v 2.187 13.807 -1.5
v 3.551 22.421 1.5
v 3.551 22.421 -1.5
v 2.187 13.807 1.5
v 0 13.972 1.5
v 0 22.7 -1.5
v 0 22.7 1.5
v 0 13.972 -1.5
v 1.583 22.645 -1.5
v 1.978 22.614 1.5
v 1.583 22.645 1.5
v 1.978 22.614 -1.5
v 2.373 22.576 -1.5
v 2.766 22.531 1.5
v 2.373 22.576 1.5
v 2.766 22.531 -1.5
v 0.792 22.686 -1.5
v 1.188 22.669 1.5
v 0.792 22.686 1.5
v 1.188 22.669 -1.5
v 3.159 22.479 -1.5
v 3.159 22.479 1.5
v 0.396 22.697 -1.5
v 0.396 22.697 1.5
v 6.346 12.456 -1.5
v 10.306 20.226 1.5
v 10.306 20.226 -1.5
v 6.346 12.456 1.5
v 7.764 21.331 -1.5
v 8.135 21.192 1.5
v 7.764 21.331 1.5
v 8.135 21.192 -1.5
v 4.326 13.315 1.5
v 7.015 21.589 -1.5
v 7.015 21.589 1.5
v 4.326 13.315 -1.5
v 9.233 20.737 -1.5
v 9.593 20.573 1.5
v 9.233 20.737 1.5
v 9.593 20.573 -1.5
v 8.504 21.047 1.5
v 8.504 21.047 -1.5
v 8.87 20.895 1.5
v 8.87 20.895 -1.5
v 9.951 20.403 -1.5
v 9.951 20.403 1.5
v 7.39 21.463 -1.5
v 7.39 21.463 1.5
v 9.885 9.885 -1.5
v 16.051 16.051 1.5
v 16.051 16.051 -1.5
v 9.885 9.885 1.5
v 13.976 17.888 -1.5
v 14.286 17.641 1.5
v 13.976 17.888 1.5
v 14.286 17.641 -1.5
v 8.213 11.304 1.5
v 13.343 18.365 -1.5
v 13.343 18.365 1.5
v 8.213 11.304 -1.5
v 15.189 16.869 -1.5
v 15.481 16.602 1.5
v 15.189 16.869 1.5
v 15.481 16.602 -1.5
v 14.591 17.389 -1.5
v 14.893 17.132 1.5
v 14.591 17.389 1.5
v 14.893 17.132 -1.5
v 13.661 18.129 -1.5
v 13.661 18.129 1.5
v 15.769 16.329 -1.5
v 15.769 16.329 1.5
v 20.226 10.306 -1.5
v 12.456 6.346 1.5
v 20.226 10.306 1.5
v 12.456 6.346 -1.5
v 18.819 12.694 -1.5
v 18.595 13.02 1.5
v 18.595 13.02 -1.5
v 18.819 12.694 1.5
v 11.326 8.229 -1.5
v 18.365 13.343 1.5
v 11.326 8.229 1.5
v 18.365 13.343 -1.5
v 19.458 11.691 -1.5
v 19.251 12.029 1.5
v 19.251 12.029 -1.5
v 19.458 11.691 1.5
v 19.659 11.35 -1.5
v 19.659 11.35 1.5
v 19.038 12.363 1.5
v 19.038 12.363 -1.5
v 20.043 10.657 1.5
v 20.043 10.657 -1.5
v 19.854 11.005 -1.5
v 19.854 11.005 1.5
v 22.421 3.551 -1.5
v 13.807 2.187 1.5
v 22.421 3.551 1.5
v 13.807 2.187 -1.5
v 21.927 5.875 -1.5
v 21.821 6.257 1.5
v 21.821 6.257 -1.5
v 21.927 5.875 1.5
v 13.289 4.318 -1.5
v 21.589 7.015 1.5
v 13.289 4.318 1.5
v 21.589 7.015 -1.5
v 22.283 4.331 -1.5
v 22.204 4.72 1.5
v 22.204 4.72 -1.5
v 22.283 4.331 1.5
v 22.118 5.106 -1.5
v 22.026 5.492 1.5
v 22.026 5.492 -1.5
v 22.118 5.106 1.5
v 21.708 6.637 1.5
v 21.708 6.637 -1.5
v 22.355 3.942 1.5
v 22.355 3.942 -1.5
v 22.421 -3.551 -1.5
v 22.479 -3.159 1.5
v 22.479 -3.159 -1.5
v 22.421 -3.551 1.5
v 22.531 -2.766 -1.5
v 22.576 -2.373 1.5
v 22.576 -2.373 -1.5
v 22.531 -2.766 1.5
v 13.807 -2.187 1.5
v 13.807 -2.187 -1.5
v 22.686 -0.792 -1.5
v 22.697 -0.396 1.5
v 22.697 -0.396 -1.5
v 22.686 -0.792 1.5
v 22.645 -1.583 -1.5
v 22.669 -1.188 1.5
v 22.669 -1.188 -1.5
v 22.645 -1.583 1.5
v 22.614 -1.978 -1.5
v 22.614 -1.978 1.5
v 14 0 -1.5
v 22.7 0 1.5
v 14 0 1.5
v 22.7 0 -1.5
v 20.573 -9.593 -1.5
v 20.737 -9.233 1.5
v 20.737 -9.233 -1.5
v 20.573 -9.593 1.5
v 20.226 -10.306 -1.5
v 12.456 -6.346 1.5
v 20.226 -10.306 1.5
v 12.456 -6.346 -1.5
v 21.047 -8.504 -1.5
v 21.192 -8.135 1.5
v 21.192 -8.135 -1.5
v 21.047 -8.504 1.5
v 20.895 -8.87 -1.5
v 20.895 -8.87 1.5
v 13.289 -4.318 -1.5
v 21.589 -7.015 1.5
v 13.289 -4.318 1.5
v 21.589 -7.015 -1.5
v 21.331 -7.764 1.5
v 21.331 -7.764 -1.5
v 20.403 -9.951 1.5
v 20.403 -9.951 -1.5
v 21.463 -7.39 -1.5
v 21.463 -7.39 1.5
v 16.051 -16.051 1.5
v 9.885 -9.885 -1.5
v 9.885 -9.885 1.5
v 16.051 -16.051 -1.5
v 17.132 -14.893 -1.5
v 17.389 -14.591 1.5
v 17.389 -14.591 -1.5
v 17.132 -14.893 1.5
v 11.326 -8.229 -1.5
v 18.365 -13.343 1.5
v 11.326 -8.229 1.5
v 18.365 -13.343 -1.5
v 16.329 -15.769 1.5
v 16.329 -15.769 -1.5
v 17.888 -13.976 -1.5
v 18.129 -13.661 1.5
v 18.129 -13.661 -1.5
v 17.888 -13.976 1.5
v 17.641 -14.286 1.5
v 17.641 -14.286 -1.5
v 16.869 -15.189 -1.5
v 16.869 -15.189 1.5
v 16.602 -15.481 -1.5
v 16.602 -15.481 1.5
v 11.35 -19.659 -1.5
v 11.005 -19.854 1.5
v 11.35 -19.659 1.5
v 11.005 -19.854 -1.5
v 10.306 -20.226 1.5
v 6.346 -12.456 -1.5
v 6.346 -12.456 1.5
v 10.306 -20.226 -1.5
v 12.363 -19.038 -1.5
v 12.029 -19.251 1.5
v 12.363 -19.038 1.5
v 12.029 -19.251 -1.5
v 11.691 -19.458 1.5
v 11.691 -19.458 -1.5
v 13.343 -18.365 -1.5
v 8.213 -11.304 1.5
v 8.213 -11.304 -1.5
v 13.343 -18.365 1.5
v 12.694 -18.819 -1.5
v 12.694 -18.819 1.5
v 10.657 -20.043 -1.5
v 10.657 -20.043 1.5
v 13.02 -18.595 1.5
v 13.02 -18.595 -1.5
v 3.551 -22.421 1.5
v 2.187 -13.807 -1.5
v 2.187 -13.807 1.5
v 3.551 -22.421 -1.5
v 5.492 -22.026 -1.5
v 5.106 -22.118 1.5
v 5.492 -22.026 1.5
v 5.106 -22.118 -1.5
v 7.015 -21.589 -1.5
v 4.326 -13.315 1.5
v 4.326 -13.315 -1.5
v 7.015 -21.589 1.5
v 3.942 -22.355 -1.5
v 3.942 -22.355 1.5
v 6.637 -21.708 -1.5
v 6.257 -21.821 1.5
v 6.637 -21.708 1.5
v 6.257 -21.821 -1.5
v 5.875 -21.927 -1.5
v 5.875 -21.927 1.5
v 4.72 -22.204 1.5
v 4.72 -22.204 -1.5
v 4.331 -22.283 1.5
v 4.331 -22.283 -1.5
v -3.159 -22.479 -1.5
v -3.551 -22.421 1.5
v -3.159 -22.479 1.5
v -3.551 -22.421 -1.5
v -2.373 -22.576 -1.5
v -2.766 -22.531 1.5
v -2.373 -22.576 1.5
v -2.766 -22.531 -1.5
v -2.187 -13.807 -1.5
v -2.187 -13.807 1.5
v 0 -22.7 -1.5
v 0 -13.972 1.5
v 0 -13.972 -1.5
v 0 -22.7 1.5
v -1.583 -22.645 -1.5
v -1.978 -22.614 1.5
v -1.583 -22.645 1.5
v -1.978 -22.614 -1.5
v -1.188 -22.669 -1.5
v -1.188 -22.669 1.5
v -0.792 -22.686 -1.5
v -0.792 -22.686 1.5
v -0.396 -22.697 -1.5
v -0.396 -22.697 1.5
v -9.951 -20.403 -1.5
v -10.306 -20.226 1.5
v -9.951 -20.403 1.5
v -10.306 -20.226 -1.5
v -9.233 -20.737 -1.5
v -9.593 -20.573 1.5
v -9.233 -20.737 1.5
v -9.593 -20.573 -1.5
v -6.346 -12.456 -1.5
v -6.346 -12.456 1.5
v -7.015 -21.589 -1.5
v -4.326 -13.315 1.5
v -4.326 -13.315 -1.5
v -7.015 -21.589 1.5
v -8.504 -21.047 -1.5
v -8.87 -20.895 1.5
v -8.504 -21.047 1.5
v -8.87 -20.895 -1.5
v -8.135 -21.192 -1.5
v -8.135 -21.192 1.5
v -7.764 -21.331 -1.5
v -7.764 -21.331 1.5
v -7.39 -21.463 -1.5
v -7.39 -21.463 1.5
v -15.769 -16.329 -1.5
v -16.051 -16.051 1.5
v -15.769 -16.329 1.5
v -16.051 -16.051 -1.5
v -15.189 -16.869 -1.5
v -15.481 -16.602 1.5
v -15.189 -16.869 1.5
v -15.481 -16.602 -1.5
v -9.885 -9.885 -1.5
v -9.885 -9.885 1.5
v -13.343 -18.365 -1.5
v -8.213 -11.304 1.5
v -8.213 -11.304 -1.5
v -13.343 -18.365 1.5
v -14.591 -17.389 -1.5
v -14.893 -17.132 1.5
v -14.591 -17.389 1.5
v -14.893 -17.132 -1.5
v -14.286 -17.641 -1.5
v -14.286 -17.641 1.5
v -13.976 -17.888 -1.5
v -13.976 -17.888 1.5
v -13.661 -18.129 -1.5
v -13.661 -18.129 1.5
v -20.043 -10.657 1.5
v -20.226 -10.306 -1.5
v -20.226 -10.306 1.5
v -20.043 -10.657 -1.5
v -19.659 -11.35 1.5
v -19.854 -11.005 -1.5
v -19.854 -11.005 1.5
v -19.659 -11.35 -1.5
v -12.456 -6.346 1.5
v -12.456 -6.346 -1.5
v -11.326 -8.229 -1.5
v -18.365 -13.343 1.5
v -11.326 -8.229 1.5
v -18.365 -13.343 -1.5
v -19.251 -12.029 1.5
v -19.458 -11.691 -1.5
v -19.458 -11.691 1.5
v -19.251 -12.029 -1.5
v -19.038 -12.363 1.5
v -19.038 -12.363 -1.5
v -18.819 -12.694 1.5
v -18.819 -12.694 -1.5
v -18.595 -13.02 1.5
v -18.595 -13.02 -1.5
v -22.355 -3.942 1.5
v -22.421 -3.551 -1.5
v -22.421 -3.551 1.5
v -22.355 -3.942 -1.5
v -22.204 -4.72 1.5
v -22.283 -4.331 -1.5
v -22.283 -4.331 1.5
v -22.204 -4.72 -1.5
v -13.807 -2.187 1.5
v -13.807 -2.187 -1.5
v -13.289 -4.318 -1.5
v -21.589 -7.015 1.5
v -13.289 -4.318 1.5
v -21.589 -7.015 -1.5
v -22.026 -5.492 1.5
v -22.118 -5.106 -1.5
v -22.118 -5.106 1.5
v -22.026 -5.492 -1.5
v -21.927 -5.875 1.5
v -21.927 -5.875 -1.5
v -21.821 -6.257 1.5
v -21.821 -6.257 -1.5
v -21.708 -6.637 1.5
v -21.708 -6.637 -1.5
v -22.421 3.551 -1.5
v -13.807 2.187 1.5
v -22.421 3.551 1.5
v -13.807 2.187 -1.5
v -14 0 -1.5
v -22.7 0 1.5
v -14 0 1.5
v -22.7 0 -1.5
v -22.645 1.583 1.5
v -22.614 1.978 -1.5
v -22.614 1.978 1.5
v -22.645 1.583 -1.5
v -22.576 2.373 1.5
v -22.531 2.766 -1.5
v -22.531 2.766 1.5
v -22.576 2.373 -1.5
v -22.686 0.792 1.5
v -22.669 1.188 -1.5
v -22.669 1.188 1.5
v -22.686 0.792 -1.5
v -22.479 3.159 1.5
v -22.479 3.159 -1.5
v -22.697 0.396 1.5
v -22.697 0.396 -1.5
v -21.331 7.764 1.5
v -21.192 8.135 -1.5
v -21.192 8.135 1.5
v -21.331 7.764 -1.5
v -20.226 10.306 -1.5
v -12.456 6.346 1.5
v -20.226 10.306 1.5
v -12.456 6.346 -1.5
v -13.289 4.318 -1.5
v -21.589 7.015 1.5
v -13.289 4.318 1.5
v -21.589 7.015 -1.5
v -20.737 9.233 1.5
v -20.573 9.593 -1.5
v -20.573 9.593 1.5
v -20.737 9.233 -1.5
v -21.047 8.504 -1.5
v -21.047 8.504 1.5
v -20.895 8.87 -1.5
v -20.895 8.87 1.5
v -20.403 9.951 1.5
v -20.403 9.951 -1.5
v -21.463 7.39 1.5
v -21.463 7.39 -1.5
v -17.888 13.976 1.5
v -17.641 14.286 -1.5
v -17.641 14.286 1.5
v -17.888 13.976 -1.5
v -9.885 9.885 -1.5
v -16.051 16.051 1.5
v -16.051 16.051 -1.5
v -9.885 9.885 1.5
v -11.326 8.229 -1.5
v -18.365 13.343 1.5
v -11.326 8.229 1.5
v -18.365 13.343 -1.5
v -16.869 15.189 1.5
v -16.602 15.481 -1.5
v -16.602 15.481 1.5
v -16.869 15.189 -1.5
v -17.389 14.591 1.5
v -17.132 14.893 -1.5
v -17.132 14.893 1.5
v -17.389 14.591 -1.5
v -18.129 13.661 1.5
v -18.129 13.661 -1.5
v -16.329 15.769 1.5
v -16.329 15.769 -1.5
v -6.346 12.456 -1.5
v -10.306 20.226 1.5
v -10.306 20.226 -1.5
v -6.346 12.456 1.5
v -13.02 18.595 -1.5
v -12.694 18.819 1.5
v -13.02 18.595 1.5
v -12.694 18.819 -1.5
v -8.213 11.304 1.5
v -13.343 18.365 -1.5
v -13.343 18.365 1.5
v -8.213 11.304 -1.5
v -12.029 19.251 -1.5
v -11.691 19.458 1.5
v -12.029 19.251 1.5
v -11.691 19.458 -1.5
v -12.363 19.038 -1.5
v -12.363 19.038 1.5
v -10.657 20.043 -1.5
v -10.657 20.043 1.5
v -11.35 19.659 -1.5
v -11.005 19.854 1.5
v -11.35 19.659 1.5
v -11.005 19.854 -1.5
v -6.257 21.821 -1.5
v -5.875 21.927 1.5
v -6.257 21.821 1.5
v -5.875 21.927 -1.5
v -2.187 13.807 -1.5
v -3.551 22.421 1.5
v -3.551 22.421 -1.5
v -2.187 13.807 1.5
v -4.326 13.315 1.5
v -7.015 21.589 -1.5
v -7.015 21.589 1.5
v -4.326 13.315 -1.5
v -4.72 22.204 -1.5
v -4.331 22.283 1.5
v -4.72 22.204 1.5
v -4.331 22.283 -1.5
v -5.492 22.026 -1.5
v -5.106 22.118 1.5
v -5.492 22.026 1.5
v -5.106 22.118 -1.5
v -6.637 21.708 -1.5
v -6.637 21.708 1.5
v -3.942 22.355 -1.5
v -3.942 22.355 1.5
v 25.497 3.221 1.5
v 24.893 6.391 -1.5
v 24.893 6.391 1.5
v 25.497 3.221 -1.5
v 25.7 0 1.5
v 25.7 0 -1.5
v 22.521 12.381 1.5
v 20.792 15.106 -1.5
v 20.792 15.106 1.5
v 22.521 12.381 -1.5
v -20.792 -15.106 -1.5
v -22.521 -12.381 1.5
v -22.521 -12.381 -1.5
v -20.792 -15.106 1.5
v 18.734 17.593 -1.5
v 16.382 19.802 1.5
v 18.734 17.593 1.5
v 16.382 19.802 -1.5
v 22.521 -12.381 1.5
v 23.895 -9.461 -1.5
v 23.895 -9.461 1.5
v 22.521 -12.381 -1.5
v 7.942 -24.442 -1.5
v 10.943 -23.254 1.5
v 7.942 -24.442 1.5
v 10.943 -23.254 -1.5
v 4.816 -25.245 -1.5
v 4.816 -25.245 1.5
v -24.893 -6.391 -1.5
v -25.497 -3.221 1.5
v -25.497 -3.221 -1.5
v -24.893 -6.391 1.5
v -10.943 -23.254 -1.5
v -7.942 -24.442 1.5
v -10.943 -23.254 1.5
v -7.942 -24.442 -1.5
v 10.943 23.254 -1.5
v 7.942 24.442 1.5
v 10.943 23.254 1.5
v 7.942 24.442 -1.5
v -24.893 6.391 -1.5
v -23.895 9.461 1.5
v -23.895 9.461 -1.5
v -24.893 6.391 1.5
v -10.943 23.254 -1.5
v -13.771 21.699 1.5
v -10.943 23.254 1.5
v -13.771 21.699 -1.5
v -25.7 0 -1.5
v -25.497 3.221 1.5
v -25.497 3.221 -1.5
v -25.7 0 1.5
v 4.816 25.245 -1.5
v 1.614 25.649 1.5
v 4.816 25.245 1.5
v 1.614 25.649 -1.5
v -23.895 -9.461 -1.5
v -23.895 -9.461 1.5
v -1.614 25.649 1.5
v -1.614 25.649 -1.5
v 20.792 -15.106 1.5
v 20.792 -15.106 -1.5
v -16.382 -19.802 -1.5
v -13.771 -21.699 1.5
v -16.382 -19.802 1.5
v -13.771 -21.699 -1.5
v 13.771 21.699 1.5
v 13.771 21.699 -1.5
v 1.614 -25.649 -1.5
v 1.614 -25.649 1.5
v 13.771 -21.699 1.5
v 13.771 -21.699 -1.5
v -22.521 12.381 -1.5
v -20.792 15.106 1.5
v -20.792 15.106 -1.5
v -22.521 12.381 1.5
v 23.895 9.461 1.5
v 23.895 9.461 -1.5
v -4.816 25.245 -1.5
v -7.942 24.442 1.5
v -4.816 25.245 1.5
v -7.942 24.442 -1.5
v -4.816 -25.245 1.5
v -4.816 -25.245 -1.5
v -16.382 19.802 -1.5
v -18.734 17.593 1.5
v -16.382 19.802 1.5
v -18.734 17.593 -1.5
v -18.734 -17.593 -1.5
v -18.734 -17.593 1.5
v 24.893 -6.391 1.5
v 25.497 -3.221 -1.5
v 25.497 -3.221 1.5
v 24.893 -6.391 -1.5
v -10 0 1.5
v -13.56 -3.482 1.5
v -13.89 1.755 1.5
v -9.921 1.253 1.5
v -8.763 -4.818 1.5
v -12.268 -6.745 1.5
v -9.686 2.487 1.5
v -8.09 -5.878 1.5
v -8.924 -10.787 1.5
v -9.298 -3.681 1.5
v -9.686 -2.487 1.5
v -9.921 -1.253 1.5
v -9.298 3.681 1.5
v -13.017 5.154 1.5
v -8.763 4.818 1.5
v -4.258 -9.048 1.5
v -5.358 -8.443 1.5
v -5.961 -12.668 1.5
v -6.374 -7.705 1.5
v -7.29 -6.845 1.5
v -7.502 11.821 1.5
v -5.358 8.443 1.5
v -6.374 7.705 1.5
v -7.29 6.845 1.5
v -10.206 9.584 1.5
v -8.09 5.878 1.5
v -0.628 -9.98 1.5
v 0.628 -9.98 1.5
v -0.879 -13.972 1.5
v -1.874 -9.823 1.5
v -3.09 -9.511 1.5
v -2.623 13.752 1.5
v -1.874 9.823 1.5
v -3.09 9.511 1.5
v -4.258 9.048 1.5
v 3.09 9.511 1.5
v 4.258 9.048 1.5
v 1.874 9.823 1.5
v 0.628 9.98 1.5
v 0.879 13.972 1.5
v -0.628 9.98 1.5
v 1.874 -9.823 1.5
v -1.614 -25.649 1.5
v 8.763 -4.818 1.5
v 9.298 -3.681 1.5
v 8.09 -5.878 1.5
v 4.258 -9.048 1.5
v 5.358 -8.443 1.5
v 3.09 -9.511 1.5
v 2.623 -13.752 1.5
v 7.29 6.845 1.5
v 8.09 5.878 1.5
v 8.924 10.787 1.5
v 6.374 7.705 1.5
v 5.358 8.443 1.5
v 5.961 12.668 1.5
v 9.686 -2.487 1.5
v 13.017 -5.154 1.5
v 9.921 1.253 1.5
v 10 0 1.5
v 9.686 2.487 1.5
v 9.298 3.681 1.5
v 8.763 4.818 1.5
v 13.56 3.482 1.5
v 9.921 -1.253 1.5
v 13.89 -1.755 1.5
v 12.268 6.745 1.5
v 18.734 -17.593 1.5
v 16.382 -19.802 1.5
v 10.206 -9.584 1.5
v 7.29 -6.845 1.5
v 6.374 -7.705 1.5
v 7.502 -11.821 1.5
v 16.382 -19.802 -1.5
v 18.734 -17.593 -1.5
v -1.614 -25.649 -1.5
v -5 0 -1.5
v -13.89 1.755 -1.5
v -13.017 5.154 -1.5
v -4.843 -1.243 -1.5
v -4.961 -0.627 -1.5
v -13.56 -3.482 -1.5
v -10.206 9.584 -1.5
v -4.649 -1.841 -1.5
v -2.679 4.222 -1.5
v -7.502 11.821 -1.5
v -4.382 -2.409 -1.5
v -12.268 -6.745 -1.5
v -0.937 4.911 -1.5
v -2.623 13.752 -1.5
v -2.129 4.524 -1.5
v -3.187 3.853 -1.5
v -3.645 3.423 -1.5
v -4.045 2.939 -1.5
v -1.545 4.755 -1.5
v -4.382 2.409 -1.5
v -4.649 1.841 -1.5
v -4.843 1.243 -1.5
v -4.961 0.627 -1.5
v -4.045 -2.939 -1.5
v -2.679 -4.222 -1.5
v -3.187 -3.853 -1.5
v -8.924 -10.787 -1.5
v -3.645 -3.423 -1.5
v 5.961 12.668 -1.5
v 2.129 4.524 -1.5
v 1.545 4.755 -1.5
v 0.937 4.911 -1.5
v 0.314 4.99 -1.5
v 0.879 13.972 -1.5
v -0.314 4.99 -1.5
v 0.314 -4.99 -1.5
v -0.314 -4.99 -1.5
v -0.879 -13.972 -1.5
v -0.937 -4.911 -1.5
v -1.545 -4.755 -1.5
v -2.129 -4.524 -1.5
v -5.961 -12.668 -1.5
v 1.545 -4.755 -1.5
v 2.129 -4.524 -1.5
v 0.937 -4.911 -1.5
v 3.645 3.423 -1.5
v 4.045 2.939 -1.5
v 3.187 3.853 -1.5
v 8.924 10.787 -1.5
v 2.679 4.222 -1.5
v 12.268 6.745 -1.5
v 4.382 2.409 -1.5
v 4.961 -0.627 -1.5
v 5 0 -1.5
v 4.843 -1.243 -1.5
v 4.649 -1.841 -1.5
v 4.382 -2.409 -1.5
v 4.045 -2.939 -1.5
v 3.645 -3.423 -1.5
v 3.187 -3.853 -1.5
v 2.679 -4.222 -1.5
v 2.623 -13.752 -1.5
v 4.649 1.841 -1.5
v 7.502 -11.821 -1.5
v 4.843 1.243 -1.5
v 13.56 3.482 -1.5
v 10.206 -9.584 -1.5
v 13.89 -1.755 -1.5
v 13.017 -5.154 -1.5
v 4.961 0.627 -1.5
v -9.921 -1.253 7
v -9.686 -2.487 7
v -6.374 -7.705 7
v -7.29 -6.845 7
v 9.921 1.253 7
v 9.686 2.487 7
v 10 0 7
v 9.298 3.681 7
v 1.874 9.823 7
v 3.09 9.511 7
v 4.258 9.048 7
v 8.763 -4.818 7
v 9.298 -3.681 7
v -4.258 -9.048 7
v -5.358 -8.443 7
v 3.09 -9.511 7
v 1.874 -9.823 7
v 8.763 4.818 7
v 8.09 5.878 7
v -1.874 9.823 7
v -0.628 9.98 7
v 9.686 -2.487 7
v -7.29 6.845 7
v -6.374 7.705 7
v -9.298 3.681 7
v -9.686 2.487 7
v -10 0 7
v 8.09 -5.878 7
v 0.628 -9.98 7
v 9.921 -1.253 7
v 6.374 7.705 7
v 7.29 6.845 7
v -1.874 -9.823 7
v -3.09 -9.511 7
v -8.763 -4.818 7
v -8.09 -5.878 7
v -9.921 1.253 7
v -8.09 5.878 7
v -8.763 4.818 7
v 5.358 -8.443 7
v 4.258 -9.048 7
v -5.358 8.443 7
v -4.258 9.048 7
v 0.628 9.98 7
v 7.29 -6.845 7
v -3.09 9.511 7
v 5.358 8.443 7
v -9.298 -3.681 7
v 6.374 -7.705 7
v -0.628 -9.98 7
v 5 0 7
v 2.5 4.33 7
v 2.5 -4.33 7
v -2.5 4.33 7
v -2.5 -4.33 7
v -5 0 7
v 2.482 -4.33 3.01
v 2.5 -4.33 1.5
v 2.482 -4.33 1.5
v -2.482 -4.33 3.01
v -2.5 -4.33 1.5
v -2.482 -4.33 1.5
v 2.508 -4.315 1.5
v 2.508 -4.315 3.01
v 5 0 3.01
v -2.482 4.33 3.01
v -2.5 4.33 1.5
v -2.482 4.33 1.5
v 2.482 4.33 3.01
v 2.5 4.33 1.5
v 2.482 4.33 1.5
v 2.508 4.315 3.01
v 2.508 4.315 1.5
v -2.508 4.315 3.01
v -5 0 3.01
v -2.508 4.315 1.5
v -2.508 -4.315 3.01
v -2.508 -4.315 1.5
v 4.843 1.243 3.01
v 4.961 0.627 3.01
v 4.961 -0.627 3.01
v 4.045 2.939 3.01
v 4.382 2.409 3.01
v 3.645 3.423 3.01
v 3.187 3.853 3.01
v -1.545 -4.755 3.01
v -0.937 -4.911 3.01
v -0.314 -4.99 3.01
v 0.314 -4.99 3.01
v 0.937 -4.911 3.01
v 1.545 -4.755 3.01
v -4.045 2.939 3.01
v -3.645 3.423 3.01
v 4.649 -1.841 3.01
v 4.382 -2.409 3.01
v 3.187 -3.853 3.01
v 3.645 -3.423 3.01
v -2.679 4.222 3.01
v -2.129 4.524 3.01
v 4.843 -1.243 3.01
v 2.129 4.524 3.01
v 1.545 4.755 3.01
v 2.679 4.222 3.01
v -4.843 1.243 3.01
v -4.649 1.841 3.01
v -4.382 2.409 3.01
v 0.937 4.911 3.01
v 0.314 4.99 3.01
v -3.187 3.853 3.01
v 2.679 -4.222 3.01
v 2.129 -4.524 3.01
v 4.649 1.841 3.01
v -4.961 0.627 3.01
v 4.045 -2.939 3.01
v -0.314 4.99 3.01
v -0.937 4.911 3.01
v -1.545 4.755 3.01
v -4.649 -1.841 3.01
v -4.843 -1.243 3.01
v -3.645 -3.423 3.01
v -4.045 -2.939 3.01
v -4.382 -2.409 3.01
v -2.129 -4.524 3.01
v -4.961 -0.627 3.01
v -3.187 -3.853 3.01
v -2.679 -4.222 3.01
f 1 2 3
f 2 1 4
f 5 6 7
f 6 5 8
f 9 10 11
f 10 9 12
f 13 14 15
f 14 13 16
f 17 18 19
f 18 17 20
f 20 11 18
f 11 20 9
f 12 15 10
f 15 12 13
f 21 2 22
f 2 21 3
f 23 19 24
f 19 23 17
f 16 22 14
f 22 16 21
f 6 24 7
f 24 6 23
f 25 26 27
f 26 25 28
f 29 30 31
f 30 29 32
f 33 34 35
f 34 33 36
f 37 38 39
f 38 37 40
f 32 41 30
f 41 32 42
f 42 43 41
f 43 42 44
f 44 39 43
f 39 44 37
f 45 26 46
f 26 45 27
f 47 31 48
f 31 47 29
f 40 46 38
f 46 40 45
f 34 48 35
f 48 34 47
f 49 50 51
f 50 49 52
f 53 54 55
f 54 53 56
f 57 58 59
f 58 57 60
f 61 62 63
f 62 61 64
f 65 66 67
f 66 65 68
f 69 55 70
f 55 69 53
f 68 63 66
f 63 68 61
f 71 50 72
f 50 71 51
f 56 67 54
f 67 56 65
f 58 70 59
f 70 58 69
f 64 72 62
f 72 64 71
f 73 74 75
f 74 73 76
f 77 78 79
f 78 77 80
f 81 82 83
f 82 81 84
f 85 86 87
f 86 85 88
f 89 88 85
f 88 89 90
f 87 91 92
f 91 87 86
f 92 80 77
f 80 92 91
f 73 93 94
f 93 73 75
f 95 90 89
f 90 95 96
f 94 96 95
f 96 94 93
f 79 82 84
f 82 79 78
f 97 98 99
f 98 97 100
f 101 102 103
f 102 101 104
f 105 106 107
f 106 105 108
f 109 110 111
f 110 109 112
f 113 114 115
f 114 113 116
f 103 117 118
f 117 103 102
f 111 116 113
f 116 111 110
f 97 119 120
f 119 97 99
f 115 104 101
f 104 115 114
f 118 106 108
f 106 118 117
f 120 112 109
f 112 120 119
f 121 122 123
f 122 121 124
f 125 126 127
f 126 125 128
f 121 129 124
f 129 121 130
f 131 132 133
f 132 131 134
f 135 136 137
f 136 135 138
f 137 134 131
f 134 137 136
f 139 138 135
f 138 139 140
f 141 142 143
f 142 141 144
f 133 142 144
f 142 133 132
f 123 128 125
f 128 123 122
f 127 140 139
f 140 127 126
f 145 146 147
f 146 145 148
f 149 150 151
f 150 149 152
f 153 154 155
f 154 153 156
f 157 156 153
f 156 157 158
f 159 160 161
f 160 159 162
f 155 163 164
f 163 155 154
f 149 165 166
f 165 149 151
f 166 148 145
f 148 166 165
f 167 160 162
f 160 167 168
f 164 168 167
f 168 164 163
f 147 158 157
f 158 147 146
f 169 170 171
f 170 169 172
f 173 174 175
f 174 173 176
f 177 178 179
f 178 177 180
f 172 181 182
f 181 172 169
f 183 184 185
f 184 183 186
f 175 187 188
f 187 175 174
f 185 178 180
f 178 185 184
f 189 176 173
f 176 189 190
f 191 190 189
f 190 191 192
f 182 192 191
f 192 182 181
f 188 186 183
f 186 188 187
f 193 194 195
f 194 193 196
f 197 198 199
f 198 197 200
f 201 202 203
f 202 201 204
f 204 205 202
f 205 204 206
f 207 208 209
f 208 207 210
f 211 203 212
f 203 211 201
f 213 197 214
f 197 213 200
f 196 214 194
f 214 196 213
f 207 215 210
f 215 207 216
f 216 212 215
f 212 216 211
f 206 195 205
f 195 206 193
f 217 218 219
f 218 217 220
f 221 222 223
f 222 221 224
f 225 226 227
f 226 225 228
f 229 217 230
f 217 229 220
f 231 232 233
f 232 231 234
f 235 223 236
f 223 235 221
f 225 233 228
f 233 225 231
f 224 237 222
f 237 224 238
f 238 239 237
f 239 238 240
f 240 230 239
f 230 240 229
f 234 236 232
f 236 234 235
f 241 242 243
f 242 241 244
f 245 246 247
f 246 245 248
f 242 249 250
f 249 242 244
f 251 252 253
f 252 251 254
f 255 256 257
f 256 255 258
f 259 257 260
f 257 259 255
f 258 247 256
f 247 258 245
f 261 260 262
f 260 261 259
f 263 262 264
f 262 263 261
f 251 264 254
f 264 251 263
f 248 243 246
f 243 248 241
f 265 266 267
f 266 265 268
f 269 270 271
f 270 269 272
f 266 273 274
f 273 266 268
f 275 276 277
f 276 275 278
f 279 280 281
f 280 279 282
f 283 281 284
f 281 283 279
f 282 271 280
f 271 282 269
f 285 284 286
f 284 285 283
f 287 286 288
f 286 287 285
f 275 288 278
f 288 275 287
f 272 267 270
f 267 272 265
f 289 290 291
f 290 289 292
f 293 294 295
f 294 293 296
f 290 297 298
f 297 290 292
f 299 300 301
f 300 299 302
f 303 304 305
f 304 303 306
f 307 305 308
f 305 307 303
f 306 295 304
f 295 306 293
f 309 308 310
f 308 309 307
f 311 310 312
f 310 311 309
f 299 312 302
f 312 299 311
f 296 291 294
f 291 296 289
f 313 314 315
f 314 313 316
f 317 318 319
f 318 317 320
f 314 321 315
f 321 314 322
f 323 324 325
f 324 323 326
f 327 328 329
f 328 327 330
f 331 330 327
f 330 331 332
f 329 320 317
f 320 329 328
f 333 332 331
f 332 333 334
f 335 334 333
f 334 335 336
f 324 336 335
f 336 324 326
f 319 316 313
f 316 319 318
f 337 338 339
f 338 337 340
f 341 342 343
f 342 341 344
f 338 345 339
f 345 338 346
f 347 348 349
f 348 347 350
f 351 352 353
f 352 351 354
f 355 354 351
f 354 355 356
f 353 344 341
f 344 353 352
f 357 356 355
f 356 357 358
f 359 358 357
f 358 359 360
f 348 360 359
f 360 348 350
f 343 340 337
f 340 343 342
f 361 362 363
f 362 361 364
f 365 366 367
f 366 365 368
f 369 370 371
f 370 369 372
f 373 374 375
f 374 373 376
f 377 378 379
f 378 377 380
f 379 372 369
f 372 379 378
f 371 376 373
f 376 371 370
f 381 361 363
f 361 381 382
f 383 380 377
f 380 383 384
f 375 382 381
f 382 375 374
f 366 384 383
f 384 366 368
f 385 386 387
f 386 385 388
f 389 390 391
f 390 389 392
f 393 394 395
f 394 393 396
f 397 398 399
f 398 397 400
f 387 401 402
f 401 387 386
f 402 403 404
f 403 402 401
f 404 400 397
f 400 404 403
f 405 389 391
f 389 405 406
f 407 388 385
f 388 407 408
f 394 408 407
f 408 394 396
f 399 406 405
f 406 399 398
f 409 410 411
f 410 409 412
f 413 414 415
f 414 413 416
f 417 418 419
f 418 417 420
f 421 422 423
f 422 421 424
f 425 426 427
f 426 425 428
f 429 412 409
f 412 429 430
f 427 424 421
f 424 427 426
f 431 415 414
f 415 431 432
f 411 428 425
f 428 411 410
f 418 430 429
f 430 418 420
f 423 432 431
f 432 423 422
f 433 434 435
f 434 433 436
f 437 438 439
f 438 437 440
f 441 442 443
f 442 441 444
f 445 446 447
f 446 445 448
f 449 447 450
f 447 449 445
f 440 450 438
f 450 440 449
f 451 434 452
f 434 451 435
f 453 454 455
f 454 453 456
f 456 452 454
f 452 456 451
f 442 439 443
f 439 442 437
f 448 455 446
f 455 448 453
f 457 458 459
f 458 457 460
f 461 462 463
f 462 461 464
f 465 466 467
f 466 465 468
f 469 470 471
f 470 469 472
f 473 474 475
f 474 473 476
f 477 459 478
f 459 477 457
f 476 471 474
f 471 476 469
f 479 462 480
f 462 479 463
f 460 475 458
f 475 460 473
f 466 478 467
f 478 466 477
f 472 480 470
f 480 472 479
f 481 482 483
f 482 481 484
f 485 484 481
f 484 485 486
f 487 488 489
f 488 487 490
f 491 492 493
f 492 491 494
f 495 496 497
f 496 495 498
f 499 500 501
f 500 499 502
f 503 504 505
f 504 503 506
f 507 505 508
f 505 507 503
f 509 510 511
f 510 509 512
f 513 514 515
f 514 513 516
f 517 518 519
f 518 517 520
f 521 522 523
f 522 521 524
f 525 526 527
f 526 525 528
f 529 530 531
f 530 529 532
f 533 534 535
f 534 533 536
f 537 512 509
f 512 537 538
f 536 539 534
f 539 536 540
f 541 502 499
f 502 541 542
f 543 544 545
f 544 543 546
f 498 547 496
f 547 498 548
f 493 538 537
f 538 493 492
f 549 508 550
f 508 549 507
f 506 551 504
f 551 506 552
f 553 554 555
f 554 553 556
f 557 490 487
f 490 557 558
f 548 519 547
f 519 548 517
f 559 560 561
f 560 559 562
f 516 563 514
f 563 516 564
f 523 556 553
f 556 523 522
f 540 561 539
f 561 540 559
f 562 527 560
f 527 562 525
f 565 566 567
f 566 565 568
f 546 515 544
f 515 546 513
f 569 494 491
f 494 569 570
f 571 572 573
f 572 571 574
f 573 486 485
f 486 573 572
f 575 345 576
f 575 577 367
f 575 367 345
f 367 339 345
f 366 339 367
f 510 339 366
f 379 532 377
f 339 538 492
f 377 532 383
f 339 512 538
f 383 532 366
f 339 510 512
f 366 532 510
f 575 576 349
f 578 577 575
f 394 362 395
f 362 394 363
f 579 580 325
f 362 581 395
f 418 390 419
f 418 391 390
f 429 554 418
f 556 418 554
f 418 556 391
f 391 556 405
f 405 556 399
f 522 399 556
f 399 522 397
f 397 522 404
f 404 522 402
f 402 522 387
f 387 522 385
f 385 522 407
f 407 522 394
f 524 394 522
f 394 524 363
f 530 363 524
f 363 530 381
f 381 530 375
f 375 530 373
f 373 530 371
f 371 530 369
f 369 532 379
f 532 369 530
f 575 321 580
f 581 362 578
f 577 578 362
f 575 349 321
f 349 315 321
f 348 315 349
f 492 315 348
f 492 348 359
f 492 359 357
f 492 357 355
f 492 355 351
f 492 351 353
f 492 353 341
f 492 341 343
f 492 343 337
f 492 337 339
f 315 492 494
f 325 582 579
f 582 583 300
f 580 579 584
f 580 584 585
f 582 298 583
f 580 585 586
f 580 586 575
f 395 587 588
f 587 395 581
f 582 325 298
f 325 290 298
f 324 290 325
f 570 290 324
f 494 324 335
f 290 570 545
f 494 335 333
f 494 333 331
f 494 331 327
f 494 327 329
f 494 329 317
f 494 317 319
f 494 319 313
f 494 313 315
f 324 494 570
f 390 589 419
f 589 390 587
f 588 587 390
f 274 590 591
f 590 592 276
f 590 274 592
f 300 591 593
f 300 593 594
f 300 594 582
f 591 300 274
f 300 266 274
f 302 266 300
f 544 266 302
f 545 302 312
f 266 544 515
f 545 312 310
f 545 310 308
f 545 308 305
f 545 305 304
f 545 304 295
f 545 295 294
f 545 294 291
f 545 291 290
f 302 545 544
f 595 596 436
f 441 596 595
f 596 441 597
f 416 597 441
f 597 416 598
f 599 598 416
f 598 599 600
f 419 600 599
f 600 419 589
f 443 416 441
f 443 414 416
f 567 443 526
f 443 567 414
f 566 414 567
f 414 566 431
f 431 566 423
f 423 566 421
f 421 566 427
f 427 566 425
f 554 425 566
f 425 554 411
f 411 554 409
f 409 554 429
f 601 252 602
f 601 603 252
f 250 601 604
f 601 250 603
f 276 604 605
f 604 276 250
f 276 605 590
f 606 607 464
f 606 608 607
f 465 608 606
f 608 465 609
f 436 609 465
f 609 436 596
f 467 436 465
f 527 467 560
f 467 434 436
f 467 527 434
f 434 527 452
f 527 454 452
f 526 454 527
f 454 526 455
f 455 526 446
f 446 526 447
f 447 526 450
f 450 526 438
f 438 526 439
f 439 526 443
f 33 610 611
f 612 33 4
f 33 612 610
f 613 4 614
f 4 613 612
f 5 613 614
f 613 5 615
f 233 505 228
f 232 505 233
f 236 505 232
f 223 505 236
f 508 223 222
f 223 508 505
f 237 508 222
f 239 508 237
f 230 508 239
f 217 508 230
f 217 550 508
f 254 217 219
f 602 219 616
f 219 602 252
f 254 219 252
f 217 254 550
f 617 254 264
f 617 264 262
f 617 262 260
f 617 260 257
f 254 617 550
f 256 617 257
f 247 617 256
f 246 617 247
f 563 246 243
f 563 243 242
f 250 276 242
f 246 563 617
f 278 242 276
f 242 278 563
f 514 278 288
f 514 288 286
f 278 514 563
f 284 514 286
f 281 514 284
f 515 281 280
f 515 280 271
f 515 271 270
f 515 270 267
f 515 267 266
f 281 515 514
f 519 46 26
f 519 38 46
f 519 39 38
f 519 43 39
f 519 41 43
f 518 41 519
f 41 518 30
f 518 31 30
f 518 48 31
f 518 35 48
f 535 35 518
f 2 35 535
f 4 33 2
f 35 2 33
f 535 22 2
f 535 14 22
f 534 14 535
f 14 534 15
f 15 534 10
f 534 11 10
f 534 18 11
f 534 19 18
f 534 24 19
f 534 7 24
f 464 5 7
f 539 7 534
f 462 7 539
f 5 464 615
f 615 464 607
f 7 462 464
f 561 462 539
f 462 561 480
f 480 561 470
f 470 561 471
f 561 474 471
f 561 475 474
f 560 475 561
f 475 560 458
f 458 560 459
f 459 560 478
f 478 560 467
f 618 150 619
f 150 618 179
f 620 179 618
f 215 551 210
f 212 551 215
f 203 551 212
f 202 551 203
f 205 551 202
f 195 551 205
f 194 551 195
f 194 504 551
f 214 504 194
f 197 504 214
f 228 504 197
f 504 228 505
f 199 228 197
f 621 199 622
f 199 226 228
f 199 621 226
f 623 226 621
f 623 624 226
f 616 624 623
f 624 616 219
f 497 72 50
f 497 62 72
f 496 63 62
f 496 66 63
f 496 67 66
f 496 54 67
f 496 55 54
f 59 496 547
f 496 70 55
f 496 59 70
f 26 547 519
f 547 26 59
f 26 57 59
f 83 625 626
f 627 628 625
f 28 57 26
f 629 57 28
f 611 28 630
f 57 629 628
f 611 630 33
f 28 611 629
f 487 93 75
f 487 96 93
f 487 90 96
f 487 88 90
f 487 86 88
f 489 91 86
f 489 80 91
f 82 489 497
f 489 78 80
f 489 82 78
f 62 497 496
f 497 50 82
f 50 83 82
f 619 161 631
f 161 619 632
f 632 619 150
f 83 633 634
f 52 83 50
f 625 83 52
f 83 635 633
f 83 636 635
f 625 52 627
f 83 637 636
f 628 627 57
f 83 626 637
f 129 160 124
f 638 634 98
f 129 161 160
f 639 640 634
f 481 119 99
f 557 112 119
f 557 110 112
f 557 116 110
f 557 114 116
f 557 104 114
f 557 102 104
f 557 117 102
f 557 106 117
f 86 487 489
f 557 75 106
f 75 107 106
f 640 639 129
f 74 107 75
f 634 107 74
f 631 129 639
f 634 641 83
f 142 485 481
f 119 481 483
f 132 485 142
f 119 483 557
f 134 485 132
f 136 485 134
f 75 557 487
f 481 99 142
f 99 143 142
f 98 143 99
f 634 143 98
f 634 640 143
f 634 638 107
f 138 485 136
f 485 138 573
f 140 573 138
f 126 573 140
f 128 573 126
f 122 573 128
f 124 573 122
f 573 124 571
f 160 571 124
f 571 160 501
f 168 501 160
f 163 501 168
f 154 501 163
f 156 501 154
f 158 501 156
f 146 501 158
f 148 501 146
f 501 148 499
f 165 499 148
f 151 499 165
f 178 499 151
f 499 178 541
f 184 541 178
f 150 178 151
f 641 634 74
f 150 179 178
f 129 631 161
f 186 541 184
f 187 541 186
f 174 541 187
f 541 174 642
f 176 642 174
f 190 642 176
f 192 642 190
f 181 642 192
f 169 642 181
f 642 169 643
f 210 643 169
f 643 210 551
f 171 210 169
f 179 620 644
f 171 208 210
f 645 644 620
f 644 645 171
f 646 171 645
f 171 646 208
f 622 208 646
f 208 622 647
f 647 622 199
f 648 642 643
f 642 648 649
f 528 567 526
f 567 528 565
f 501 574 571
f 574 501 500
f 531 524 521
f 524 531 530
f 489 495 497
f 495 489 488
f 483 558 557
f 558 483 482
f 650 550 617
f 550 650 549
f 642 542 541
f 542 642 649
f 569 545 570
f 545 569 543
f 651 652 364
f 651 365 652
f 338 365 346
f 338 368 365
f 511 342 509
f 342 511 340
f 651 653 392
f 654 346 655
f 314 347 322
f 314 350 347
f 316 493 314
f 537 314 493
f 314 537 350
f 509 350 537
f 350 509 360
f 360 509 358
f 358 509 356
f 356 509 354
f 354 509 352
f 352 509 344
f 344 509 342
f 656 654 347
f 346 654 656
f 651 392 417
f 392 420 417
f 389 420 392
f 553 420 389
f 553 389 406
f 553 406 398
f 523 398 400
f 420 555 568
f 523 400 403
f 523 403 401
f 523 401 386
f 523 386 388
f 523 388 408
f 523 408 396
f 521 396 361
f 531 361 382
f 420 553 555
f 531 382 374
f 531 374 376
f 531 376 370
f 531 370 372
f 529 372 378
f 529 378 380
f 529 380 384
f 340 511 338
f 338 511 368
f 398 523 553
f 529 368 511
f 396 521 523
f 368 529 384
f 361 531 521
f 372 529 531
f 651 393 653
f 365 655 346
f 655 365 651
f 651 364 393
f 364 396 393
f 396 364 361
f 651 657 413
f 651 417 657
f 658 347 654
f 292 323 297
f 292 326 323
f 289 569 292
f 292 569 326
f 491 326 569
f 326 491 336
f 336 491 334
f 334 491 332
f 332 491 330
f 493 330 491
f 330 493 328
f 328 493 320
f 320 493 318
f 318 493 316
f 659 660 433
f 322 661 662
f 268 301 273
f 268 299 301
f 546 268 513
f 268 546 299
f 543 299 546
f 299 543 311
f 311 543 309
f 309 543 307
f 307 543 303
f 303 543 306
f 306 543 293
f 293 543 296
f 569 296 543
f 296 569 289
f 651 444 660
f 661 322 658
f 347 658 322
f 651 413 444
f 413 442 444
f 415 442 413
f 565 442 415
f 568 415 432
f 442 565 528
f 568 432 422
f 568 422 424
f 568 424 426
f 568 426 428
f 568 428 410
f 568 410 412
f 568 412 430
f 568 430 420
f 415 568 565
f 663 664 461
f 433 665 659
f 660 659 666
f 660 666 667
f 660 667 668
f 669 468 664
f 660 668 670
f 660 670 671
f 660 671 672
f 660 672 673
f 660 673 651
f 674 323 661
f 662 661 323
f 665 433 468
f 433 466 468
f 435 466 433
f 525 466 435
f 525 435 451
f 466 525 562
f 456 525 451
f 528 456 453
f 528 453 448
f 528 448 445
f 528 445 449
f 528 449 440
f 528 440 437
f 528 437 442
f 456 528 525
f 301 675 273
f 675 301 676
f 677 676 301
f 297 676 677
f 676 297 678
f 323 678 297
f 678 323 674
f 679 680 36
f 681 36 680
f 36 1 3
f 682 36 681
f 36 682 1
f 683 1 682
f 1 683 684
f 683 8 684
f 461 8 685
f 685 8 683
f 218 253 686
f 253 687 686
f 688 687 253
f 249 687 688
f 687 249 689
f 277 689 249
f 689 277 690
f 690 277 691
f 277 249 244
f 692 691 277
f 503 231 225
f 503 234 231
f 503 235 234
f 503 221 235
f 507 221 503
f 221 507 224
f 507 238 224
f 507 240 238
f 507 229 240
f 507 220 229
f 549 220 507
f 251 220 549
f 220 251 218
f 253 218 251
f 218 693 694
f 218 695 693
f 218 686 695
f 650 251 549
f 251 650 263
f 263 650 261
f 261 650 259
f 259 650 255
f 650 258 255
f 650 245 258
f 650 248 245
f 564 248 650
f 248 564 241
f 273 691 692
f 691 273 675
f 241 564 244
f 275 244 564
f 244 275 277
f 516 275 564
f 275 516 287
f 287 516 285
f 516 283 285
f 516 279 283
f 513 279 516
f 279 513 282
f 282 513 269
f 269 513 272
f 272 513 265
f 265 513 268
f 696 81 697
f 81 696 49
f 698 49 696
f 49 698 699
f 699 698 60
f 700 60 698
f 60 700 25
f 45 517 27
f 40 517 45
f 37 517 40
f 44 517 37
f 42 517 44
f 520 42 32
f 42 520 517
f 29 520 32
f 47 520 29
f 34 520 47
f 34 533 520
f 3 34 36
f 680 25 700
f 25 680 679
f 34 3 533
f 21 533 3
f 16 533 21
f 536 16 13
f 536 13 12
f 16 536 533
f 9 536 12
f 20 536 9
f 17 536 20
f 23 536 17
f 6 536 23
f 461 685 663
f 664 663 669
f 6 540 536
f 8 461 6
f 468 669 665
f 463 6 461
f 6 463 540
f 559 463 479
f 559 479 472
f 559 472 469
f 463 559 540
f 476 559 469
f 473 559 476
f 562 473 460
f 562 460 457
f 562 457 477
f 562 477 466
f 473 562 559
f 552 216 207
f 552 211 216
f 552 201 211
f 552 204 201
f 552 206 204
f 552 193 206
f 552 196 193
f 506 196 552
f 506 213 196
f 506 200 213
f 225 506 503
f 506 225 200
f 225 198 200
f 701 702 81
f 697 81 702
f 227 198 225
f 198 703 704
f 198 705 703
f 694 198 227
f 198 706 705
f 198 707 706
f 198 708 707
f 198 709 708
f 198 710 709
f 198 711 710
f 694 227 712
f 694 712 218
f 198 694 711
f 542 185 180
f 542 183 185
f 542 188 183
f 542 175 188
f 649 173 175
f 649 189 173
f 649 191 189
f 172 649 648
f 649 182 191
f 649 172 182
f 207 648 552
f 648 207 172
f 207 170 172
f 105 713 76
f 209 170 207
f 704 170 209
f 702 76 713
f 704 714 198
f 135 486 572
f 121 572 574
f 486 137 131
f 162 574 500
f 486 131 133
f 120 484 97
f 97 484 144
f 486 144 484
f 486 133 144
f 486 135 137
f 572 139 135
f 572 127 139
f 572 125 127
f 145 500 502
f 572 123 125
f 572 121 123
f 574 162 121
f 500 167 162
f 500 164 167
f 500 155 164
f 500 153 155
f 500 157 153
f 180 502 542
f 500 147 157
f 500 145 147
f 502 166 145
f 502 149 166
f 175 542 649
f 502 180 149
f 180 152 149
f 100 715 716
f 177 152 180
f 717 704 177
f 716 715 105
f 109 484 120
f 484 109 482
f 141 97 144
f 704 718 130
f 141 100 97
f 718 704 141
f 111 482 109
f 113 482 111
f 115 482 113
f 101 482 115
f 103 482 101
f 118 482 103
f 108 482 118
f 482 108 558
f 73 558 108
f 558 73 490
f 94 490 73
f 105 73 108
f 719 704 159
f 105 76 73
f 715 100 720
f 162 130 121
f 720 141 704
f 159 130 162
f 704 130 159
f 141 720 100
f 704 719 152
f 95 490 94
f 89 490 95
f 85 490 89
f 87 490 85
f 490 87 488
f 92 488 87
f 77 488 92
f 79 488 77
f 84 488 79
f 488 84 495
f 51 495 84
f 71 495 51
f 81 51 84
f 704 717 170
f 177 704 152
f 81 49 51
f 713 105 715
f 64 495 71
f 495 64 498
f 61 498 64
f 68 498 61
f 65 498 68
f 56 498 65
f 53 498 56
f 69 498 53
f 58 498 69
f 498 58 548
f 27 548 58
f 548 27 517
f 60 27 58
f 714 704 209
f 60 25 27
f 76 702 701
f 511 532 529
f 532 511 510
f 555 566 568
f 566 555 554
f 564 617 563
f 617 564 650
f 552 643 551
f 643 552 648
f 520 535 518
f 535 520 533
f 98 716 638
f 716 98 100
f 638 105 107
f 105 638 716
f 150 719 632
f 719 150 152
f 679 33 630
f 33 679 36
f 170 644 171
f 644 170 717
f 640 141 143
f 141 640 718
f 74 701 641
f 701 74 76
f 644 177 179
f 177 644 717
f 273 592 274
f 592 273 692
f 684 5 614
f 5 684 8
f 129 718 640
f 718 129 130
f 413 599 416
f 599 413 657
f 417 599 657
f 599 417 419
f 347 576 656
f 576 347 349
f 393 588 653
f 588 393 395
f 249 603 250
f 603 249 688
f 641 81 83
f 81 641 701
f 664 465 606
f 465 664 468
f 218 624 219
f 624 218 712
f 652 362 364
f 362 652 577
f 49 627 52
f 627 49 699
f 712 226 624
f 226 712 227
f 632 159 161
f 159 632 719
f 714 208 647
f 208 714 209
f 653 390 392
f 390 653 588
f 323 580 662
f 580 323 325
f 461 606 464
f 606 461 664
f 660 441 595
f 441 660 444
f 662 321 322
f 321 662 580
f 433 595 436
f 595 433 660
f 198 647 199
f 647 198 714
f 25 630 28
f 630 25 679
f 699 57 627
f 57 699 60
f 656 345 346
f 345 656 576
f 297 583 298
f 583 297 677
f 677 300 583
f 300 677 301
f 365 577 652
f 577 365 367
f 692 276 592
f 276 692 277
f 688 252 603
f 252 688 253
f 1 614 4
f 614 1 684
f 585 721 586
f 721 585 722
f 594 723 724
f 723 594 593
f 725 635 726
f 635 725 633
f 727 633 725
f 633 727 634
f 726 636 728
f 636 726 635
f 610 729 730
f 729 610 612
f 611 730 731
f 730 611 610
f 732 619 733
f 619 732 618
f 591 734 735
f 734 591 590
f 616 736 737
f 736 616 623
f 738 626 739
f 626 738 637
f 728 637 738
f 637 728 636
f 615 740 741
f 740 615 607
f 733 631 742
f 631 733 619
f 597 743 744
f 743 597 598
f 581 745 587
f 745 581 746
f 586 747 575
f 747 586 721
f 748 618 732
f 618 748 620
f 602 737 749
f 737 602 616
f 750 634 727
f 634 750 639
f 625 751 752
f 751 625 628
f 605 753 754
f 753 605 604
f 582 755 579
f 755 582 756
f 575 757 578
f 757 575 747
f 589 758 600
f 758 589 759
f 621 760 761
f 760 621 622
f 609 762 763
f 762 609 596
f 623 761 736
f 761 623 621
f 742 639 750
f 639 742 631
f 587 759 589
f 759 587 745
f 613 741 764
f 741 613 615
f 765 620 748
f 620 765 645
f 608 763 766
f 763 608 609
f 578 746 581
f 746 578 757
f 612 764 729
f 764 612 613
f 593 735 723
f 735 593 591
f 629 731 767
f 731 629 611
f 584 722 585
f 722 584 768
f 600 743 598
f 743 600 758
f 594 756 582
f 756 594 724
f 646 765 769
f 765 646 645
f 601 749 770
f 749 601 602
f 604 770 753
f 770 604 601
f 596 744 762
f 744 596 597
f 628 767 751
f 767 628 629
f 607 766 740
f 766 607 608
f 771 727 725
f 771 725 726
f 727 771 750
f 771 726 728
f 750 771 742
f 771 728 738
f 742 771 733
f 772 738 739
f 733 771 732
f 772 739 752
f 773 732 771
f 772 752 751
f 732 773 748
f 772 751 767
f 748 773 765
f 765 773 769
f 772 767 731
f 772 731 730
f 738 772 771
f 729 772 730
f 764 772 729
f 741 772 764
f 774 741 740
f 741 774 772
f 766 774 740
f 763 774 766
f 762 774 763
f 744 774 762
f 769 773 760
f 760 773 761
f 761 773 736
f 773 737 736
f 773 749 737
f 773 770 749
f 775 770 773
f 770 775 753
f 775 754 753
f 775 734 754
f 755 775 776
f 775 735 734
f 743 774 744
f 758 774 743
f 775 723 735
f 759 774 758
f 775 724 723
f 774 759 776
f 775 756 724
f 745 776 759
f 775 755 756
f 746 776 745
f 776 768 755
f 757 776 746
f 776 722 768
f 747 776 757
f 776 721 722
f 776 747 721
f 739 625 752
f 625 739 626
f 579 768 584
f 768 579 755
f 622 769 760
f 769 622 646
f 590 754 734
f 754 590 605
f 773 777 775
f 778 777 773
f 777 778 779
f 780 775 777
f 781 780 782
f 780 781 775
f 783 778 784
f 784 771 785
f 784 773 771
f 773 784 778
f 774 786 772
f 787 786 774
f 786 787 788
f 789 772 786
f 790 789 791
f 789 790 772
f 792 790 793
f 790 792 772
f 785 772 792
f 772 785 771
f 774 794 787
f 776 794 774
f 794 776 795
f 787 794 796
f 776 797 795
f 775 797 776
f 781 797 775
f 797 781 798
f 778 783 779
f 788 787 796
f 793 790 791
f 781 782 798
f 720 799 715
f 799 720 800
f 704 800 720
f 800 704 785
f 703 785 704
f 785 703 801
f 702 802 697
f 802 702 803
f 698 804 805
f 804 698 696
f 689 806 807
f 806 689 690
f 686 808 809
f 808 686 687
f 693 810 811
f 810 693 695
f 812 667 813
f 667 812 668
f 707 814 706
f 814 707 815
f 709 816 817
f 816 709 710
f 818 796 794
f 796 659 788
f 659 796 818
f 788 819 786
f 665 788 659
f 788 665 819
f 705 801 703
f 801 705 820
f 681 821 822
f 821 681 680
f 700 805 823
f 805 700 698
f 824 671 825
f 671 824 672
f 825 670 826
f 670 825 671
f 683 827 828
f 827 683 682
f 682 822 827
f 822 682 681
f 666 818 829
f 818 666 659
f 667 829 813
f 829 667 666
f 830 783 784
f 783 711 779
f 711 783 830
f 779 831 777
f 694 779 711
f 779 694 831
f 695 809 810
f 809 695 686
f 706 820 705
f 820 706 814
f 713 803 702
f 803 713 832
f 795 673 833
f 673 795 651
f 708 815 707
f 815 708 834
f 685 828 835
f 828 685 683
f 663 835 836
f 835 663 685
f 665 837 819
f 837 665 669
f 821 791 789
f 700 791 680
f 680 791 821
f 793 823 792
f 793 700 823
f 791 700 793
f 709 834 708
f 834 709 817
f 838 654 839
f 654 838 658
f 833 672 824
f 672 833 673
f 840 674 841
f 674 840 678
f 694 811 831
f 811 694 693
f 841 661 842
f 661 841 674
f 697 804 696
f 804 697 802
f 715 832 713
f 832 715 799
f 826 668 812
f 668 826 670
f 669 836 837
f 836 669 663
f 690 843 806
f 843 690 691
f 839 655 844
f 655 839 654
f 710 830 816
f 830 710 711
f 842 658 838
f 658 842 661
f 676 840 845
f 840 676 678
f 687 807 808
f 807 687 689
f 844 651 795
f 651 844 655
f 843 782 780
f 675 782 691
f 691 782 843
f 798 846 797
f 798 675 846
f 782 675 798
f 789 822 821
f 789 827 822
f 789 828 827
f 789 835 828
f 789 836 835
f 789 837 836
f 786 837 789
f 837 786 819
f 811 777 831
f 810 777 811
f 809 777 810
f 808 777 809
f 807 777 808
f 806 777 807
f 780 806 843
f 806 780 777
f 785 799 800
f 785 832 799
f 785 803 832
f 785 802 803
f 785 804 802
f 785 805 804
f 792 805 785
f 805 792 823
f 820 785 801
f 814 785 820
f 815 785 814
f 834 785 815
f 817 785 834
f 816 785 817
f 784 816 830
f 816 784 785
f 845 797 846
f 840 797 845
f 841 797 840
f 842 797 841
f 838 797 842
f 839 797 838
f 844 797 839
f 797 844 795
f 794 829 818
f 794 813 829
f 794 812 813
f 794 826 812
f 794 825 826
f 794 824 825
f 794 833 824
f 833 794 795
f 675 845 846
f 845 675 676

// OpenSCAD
/* 
 * Parametric Encoder Wheel 
 *
 * by Rafael Estevam, November 2015
 * http://www.RafaelEstevam.Net
 * 
 * Licenced under Creative Commons Public Domain
*/

ExternalRadius = 25.7;
WallTickness = 3;
InnerRadius = 14;
TeethCount = 20;
WheelHeight = 3;
CenterHoleRadius = 5.0;
CenterHoleExagonal = "No"; // [No,Yes]
CenterSupportRadius = 10;
CenterSupportHeight = 7;
CenterSupportHoleRadius = 5;
CenterSupportHoleExagonal = "Yes"; // [No,Yes]

/* [HIDDEN] */
$fn=50;

difference(){
    union(){
        Wheel(ExternalRadius,WallTickness,
              InnerRadius,TeethCount,WheelHeight);
        cylinder(h=CenterSupportHeight,
                 r=CenterSupportRadius);
    }
    translate([0,0,WheelHeight/2])
        cylinder(h=(WheelHeight+CenterSupportHeight)*2,
                 r=CenterSupportHoleRadius,
                 $fn=CenterSupportHoleExagonal == "No" ? 50:6);
    translate([0,0,-WheelHeight+0.01])
        cylinder(h=WheelHeight*2,
                 r=CenterHoleRadius,
                 $fn=CenterHoleExagonal == "No" ? 50:6);
}


module Wheel(ExtRadius,Wall,InnerRadius,TeehCount,Height){
    cylinder(r=InnerRadius,h=Height,center=true);
    difference(){
        cylinder(r=ExtRadius,h=Height,center=true);
        for(a = [0:2:TeehCount*2]){
            stepAngle = 360.0 / (TeehCount*2);
            3DArc(Height+1,a*stepAngle,
                  (a+1)*stepAngle,
                  ExtRadius-Wall);
            
        }
    }
}
module 3DArc(Height,StartAngle,EndAngle,Radius){
    linear_extrude(height=Height,center=true)
    2DArc(StartAngle,EndAngle,Radius);
}
module 2DArc(StartAngle,EndAngle,Radius){
    points = [ 
        for (a = [StartAngle : EndAngle]) 
            Radius * [ sin(a), cos(a) ] ];
    polygon(concat(points, [[0, 0]]));
}
